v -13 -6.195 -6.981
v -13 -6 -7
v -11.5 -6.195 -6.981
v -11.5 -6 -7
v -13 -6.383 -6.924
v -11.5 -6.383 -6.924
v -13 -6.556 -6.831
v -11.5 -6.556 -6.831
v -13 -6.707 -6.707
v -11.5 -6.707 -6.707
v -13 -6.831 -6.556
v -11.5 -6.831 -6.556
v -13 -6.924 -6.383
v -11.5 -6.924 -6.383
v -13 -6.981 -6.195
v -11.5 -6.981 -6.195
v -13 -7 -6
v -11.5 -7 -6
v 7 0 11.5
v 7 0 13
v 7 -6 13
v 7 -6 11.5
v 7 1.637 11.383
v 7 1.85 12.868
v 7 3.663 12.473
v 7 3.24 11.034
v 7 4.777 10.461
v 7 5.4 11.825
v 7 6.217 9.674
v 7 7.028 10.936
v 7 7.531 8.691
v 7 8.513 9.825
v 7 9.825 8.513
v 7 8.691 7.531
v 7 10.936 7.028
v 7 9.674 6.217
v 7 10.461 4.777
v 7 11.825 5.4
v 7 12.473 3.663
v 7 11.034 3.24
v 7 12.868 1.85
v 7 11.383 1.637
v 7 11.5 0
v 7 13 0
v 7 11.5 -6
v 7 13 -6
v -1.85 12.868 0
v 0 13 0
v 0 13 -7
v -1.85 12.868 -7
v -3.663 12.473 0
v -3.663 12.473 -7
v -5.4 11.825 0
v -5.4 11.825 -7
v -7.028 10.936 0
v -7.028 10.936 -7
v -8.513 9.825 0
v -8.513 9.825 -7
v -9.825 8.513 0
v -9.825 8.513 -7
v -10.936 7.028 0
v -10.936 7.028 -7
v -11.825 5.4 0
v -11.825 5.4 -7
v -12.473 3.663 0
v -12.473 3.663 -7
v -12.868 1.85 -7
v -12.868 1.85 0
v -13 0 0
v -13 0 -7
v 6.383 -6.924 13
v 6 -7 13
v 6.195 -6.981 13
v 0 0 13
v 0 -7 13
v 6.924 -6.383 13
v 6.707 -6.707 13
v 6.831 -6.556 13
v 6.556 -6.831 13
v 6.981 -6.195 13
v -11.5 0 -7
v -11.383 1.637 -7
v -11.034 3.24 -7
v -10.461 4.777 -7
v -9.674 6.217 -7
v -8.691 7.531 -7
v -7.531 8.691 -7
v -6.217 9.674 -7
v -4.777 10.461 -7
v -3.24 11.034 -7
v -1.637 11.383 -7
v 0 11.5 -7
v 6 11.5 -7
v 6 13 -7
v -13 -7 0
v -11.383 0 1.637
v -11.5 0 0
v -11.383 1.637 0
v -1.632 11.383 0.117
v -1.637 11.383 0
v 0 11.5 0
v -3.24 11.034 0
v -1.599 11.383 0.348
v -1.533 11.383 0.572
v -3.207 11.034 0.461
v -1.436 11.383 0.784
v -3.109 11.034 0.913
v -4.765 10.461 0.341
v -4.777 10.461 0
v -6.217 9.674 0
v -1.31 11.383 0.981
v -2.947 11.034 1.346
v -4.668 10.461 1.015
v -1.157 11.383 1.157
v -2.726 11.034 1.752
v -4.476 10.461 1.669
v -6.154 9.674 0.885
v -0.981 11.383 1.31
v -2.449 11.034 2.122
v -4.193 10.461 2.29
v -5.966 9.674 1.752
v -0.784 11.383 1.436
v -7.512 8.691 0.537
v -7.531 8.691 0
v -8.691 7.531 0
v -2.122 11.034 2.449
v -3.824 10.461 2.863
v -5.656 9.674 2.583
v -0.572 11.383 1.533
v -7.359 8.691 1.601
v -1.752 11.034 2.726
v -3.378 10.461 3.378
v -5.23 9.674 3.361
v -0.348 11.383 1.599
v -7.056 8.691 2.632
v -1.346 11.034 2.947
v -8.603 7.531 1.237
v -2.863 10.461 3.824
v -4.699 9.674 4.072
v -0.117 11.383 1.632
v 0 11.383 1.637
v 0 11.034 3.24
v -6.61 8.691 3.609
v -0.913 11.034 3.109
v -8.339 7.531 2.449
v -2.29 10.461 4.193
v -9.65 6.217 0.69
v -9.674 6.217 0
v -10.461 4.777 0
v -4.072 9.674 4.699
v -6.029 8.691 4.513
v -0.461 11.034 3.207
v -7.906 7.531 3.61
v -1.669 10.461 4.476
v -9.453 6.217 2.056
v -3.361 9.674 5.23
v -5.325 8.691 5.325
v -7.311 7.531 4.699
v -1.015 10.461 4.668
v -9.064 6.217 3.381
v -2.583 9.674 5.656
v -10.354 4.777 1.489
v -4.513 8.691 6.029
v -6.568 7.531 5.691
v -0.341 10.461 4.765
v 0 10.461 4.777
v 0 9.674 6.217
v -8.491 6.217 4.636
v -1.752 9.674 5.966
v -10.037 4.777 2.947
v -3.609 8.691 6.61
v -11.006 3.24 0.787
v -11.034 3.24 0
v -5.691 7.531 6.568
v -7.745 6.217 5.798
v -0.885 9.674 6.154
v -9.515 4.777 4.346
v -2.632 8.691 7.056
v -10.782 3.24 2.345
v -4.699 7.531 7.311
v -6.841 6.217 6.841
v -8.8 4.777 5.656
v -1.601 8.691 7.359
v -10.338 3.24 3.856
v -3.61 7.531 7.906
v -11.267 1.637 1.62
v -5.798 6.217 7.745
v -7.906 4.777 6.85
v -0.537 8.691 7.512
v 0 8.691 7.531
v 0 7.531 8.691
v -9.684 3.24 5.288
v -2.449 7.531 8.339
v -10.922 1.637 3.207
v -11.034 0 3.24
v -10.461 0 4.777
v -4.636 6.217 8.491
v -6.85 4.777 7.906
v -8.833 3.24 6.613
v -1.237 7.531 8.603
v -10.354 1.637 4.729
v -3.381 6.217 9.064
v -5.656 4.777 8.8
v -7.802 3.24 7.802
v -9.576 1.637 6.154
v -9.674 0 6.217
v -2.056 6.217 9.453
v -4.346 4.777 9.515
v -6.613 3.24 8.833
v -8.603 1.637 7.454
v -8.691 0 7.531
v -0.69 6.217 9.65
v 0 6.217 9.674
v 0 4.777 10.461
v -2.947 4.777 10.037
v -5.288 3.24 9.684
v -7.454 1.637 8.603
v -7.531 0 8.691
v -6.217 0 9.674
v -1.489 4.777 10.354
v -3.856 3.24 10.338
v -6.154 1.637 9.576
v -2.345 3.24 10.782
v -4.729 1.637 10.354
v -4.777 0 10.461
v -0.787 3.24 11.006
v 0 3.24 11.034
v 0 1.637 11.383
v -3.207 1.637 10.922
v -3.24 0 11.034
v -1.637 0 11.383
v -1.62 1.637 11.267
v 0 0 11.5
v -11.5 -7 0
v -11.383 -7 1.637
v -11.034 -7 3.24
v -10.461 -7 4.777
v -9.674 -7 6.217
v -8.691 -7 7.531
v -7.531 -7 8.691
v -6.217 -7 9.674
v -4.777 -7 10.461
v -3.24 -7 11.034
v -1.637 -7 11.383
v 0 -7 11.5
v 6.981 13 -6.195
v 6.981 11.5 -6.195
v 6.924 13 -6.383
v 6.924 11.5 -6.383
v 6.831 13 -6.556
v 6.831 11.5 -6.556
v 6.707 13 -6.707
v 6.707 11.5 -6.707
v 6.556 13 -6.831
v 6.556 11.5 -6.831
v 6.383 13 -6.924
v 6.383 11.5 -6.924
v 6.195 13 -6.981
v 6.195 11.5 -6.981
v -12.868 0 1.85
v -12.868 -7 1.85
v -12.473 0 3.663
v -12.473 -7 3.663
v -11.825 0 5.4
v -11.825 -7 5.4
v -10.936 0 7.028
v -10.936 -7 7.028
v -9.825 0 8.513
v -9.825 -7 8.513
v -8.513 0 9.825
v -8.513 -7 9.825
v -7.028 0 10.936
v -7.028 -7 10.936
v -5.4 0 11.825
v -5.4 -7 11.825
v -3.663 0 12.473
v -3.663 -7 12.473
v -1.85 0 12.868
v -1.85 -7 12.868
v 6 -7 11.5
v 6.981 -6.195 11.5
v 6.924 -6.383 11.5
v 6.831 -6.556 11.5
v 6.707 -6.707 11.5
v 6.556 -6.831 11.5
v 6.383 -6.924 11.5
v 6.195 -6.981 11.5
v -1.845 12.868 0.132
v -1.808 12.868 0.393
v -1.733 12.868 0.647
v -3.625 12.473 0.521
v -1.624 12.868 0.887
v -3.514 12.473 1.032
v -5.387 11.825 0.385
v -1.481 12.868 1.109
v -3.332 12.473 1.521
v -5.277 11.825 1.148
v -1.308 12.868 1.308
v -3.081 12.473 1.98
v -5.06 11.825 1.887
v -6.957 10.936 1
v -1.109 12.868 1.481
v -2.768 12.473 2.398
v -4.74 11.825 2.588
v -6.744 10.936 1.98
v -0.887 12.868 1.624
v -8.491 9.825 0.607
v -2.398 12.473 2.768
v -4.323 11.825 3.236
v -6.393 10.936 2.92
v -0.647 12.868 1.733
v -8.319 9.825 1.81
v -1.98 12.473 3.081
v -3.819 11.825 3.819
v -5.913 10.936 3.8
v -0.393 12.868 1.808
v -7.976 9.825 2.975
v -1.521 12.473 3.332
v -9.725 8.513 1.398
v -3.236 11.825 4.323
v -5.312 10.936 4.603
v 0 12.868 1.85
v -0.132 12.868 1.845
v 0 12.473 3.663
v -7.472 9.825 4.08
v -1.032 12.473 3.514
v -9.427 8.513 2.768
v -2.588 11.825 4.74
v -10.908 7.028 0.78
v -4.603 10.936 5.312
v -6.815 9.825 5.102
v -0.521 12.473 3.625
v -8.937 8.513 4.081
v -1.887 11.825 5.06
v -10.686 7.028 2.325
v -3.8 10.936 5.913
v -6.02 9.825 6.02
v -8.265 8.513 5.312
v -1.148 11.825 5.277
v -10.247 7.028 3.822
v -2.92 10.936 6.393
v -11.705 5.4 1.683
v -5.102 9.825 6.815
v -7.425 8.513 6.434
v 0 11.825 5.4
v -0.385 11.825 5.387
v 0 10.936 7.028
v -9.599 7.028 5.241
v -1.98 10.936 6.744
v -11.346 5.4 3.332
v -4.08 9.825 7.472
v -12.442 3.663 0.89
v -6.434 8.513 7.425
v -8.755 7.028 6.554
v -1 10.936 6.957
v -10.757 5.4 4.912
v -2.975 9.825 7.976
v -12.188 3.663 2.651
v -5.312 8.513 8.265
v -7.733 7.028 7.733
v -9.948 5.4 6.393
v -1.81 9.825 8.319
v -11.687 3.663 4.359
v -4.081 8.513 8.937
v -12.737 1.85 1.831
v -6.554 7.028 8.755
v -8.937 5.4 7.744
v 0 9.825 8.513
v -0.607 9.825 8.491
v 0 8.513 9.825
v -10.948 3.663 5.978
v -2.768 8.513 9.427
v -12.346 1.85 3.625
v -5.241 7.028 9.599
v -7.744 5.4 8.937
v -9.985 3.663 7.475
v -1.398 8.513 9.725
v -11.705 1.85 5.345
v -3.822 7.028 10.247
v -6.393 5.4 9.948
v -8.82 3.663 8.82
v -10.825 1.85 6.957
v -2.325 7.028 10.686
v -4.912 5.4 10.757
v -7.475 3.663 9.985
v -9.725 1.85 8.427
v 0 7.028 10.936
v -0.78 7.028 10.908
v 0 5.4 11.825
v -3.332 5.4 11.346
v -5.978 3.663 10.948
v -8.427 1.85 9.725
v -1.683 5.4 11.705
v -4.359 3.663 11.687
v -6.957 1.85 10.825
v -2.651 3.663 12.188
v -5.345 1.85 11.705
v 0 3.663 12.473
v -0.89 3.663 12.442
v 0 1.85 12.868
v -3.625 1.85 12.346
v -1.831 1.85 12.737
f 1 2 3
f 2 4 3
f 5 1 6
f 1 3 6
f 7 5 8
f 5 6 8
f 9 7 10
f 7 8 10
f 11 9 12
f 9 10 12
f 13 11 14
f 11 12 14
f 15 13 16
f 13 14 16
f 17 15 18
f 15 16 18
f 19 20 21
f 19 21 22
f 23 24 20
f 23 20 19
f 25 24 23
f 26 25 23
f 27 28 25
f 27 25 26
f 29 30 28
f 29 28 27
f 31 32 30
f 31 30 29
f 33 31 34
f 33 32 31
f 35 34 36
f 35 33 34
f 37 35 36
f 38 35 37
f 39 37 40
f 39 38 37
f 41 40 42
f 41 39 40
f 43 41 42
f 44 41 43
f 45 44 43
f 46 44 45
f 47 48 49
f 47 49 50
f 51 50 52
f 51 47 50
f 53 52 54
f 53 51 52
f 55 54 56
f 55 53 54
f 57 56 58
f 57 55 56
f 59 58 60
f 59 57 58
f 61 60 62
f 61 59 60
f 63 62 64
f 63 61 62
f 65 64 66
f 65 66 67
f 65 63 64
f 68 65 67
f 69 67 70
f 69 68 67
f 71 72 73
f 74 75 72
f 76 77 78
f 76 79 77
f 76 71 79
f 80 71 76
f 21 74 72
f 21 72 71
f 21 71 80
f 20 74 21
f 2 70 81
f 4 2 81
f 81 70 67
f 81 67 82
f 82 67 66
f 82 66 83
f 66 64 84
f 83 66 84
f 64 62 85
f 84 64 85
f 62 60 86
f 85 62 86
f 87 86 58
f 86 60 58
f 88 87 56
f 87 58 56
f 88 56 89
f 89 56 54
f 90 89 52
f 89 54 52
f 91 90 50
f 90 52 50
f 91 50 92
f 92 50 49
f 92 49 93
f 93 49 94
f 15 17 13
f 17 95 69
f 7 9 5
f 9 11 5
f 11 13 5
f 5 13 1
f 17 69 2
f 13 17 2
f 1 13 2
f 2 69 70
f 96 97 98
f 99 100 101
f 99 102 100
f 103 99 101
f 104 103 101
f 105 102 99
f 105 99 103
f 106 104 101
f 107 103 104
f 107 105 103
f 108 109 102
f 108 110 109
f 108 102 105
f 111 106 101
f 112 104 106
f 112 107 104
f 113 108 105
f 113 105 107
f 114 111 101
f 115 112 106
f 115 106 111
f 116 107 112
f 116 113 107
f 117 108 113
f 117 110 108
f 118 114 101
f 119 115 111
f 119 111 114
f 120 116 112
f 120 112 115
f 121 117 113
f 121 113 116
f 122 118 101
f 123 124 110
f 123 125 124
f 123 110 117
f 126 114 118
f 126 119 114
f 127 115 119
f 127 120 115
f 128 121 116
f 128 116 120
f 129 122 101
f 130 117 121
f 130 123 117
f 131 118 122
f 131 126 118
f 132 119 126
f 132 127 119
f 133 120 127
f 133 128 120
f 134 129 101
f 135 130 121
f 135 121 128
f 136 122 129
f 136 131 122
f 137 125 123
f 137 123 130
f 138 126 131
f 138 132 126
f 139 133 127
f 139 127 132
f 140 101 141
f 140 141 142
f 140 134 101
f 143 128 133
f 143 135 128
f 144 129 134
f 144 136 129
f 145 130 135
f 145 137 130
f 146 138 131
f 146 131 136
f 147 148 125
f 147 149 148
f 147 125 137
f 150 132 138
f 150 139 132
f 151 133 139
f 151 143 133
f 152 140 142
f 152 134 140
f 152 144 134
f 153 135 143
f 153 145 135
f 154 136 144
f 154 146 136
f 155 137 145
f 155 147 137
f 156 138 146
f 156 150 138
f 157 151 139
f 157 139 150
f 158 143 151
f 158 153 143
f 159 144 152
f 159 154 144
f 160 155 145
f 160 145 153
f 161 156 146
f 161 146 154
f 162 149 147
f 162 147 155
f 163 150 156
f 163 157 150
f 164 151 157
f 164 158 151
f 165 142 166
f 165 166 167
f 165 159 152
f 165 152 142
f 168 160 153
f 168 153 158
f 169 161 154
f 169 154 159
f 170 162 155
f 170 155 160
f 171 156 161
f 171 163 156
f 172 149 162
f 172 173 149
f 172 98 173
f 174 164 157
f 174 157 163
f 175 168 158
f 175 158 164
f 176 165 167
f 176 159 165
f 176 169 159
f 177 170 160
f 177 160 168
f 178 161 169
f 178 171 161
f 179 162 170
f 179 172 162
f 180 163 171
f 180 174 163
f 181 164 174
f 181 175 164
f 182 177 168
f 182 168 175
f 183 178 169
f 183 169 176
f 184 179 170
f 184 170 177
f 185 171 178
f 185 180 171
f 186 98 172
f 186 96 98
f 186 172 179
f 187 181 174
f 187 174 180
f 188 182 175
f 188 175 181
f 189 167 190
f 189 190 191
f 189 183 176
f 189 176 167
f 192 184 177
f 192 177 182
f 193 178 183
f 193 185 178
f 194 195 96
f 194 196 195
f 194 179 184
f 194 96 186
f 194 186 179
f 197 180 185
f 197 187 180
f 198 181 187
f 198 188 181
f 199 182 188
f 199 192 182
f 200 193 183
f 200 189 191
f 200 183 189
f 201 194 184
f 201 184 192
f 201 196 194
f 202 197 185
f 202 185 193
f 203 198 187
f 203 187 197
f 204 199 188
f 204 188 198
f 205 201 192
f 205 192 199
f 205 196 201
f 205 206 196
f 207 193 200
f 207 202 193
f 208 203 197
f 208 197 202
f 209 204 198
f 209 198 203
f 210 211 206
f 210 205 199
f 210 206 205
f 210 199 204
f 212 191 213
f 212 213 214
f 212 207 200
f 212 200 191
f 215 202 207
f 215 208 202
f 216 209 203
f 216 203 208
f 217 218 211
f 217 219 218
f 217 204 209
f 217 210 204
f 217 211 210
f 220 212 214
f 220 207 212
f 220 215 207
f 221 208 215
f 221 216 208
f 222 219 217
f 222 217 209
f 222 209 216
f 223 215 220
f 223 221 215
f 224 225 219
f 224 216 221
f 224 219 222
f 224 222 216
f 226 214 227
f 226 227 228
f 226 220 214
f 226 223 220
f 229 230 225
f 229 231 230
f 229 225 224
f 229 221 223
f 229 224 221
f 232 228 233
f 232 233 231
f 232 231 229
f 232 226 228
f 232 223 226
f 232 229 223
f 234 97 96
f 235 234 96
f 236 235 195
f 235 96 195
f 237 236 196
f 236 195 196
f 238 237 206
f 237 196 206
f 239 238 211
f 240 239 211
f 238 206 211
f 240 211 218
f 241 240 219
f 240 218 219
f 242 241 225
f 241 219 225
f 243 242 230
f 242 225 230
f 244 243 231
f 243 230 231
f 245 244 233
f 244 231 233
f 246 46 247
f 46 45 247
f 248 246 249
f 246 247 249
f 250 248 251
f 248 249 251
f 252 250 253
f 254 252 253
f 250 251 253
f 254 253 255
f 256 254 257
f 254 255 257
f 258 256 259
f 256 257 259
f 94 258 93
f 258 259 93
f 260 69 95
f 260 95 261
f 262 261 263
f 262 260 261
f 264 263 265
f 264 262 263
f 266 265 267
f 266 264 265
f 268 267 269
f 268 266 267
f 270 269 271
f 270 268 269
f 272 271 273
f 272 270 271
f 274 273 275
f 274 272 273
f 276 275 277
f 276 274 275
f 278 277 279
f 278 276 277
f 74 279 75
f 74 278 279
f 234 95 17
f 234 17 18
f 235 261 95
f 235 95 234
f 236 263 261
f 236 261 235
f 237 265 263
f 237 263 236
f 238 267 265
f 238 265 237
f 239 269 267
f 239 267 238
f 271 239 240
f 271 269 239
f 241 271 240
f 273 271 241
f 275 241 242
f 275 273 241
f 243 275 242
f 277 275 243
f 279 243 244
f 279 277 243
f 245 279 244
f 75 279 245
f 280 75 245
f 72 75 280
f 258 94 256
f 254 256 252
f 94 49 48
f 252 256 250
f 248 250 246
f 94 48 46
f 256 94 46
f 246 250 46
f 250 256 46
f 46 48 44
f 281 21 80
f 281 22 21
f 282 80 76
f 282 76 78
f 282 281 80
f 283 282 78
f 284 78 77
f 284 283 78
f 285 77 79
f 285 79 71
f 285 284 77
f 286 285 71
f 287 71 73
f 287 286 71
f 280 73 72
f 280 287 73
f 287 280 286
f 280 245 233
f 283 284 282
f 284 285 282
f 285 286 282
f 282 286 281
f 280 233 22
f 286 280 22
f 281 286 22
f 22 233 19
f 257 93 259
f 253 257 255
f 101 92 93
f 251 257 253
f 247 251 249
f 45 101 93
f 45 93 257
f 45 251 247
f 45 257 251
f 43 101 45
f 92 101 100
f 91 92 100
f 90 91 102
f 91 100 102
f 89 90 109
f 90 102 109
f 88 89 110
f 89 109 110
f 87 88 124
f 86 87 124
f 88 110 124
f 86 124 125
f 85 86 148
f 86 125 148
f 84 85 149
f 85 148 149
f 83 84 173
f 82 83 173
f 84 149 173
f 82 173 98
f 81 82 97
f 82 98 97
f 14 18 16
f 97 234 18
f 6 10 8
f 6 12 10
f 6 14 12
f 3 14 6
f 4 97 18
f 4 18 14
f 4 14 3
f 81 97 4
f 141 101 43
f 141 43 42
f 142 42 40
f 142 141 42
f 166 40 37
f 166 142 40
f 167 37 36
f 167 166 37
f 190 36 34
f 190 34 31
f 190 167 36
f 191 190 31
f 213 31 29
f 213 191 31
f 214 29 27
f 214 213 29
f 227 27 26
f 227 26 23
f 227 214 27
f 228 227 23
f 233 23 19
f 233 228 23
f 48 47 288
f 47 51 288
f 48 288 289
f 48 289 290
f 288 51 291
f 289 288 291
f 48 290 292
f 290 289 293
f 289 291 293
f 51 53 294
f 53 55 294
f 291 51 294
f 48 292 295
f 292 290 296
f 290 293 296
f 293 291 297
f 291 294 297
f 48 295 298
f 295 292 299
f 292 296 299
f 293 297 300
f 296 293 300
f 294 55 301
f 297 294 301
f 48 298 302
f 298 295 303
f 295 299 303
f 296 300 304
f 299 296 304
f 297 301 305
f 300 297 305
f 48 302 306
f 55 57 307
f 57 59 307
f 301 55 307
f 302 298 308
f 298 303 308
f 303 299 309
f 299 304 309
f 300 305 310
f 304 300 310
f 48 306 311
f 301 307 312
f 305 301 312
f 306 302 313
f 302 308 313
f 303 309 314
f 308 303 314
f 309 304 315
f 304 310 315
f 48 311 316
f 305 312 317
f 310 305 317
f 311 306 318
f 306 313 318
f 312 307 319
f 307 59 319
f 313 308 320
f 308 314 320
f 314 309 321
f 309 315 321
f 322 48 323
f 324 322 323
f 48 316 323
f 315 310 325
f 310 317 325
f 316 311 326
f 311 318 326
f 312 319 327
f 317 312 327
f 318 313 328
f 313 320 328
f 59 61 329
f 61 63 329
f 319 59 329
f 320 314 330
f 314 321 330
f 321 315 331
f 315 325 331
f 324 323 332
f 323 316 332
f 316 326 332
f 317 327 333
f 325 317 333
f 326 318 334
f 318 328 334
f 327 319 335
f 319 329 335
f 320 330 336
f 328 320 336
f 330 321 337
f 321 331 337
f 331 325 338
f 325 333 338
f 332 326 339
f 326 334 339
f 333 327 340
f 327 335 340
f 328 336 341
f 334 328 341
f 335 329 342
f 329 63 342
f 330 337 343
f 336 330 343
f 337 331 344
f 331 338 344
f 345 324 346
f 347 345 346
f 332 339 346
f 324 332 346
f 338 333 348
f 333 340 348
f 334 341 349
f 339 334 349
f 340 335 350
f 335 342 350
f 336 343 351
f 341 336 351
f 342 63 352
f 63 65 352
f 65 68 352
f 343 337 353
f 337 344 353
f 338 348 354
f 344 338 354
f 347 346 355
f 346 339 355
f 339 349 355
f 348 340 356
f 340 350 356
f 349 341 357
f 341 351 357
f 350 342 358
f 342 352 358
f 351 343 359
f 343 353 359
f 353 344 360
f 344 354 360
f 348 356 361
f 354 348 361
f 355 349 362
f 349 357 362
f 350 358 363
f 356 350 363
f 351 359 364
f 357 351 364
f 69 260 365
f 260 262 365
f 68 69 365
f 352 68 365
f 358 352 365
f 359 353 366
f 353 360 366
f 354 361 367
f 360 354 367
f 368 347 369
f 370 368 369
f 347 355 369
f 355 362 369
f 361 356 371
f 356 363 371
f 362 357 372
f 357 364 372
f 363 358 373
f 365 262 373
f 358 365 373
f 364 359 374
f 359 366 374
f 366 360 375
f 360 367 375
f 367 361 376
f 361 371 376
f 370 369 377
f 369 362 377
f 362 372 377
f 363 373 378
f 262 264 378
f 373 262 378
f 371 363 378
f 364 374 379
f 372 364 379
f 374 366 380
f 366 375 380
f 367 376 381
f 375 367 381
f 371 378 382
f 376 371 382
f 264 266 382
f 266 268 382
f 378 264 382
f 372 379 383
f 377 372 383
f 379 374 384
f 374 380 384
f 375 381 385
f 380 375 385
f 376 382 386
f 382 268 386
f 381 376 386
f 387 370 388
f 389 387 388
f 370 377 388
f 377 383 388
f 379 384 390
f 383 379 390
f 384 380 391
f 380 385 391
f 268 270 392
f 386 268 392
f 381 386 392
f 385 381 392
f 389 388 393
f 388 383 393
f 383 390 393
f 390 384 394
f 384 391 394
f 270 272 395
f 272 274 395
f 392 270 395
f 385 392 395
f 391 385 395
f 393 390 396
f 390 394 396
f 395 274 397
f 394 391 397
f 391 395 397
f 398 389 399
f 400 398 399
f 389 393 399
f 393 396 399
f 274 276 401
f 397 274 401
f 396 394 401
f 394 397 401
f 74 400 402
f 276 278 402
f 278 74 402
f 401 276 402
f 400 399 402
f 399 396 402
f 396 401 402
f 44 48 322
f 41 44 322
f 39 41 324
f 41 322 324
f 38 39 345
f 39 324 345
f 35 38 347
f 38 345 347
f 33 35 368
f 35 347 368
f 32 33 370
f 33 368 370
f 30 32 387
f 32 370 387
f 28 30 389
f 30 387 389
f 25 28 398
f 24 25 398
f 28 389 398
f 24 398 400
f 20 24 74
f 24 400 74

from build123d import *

# Parameters (mm, degrees)
F1_ANGLE = 90
F2_DEPTH = 7
F3_DEPTH = 7
F4_DEPTH = 7
F5_T     = -1.5
F6_R     = 1


with BuildPart() as f1:
    # F0 (on Top) → F1 (revolve)
    with BuildSketch(Plane.XY):
        with BuildLine():
            Line((-13, 0), (0, 0))
            Line((0, 0), (0, 13))
            ThreePointArc((0, 13), (-9.1923881554, 9.1923881554), (-13, 0))
        make_face()
    revolve(axis=Axis((0, 6.5, 0), (0, 1, 0)), revolution_arc=F1_ANGLE)

    # F2 (add): a face of the model
    f2_faces = [f1.faces().sort_by_distance(p)[0] for p in [
        (0, 5.5173713605, 5.5173713605),
    ]]
    extrude(f2_faces, amount=F2_DEPTH)

    # F3 (add): a face of the model
    f3_faces = [f1.faces().sort_by_distance(p)[0] for p in [
        (-1.8496808576, 5.9170419058, 0),
    ]]
    extrude(f3_faces, amount=F3_DEPTH)

    # F4 (add): a face of the model
    f4_faces = [f1.faces().sort_by_distance(p)[0] for p in [
        (-2.29243693, 0, 2.29243693),
    ]]
    extrude(f4_faces, amount=F4_DEPTH)

    # F5
    f5_openings = [f1.faces().sort_by_distance(p)[0] for p in [
        (7, 2.292437, 2.292437),
        (-2.292437, 2.292437, -7),
        (-2.292437, -7, 2.292437),
    ]]
    offset(amount=F5_T, openings=f5_openings)

    # F6
    f6_edges = [f1.edges().sort_by_distance(p)[0] for p in [
        (7, -7, 12.25),
        (7, 12.25, -7),
        (-12.25, -7, -7),
    ]]
    fillet(f6_edges, radius=F6_R)


solid = f1.part
